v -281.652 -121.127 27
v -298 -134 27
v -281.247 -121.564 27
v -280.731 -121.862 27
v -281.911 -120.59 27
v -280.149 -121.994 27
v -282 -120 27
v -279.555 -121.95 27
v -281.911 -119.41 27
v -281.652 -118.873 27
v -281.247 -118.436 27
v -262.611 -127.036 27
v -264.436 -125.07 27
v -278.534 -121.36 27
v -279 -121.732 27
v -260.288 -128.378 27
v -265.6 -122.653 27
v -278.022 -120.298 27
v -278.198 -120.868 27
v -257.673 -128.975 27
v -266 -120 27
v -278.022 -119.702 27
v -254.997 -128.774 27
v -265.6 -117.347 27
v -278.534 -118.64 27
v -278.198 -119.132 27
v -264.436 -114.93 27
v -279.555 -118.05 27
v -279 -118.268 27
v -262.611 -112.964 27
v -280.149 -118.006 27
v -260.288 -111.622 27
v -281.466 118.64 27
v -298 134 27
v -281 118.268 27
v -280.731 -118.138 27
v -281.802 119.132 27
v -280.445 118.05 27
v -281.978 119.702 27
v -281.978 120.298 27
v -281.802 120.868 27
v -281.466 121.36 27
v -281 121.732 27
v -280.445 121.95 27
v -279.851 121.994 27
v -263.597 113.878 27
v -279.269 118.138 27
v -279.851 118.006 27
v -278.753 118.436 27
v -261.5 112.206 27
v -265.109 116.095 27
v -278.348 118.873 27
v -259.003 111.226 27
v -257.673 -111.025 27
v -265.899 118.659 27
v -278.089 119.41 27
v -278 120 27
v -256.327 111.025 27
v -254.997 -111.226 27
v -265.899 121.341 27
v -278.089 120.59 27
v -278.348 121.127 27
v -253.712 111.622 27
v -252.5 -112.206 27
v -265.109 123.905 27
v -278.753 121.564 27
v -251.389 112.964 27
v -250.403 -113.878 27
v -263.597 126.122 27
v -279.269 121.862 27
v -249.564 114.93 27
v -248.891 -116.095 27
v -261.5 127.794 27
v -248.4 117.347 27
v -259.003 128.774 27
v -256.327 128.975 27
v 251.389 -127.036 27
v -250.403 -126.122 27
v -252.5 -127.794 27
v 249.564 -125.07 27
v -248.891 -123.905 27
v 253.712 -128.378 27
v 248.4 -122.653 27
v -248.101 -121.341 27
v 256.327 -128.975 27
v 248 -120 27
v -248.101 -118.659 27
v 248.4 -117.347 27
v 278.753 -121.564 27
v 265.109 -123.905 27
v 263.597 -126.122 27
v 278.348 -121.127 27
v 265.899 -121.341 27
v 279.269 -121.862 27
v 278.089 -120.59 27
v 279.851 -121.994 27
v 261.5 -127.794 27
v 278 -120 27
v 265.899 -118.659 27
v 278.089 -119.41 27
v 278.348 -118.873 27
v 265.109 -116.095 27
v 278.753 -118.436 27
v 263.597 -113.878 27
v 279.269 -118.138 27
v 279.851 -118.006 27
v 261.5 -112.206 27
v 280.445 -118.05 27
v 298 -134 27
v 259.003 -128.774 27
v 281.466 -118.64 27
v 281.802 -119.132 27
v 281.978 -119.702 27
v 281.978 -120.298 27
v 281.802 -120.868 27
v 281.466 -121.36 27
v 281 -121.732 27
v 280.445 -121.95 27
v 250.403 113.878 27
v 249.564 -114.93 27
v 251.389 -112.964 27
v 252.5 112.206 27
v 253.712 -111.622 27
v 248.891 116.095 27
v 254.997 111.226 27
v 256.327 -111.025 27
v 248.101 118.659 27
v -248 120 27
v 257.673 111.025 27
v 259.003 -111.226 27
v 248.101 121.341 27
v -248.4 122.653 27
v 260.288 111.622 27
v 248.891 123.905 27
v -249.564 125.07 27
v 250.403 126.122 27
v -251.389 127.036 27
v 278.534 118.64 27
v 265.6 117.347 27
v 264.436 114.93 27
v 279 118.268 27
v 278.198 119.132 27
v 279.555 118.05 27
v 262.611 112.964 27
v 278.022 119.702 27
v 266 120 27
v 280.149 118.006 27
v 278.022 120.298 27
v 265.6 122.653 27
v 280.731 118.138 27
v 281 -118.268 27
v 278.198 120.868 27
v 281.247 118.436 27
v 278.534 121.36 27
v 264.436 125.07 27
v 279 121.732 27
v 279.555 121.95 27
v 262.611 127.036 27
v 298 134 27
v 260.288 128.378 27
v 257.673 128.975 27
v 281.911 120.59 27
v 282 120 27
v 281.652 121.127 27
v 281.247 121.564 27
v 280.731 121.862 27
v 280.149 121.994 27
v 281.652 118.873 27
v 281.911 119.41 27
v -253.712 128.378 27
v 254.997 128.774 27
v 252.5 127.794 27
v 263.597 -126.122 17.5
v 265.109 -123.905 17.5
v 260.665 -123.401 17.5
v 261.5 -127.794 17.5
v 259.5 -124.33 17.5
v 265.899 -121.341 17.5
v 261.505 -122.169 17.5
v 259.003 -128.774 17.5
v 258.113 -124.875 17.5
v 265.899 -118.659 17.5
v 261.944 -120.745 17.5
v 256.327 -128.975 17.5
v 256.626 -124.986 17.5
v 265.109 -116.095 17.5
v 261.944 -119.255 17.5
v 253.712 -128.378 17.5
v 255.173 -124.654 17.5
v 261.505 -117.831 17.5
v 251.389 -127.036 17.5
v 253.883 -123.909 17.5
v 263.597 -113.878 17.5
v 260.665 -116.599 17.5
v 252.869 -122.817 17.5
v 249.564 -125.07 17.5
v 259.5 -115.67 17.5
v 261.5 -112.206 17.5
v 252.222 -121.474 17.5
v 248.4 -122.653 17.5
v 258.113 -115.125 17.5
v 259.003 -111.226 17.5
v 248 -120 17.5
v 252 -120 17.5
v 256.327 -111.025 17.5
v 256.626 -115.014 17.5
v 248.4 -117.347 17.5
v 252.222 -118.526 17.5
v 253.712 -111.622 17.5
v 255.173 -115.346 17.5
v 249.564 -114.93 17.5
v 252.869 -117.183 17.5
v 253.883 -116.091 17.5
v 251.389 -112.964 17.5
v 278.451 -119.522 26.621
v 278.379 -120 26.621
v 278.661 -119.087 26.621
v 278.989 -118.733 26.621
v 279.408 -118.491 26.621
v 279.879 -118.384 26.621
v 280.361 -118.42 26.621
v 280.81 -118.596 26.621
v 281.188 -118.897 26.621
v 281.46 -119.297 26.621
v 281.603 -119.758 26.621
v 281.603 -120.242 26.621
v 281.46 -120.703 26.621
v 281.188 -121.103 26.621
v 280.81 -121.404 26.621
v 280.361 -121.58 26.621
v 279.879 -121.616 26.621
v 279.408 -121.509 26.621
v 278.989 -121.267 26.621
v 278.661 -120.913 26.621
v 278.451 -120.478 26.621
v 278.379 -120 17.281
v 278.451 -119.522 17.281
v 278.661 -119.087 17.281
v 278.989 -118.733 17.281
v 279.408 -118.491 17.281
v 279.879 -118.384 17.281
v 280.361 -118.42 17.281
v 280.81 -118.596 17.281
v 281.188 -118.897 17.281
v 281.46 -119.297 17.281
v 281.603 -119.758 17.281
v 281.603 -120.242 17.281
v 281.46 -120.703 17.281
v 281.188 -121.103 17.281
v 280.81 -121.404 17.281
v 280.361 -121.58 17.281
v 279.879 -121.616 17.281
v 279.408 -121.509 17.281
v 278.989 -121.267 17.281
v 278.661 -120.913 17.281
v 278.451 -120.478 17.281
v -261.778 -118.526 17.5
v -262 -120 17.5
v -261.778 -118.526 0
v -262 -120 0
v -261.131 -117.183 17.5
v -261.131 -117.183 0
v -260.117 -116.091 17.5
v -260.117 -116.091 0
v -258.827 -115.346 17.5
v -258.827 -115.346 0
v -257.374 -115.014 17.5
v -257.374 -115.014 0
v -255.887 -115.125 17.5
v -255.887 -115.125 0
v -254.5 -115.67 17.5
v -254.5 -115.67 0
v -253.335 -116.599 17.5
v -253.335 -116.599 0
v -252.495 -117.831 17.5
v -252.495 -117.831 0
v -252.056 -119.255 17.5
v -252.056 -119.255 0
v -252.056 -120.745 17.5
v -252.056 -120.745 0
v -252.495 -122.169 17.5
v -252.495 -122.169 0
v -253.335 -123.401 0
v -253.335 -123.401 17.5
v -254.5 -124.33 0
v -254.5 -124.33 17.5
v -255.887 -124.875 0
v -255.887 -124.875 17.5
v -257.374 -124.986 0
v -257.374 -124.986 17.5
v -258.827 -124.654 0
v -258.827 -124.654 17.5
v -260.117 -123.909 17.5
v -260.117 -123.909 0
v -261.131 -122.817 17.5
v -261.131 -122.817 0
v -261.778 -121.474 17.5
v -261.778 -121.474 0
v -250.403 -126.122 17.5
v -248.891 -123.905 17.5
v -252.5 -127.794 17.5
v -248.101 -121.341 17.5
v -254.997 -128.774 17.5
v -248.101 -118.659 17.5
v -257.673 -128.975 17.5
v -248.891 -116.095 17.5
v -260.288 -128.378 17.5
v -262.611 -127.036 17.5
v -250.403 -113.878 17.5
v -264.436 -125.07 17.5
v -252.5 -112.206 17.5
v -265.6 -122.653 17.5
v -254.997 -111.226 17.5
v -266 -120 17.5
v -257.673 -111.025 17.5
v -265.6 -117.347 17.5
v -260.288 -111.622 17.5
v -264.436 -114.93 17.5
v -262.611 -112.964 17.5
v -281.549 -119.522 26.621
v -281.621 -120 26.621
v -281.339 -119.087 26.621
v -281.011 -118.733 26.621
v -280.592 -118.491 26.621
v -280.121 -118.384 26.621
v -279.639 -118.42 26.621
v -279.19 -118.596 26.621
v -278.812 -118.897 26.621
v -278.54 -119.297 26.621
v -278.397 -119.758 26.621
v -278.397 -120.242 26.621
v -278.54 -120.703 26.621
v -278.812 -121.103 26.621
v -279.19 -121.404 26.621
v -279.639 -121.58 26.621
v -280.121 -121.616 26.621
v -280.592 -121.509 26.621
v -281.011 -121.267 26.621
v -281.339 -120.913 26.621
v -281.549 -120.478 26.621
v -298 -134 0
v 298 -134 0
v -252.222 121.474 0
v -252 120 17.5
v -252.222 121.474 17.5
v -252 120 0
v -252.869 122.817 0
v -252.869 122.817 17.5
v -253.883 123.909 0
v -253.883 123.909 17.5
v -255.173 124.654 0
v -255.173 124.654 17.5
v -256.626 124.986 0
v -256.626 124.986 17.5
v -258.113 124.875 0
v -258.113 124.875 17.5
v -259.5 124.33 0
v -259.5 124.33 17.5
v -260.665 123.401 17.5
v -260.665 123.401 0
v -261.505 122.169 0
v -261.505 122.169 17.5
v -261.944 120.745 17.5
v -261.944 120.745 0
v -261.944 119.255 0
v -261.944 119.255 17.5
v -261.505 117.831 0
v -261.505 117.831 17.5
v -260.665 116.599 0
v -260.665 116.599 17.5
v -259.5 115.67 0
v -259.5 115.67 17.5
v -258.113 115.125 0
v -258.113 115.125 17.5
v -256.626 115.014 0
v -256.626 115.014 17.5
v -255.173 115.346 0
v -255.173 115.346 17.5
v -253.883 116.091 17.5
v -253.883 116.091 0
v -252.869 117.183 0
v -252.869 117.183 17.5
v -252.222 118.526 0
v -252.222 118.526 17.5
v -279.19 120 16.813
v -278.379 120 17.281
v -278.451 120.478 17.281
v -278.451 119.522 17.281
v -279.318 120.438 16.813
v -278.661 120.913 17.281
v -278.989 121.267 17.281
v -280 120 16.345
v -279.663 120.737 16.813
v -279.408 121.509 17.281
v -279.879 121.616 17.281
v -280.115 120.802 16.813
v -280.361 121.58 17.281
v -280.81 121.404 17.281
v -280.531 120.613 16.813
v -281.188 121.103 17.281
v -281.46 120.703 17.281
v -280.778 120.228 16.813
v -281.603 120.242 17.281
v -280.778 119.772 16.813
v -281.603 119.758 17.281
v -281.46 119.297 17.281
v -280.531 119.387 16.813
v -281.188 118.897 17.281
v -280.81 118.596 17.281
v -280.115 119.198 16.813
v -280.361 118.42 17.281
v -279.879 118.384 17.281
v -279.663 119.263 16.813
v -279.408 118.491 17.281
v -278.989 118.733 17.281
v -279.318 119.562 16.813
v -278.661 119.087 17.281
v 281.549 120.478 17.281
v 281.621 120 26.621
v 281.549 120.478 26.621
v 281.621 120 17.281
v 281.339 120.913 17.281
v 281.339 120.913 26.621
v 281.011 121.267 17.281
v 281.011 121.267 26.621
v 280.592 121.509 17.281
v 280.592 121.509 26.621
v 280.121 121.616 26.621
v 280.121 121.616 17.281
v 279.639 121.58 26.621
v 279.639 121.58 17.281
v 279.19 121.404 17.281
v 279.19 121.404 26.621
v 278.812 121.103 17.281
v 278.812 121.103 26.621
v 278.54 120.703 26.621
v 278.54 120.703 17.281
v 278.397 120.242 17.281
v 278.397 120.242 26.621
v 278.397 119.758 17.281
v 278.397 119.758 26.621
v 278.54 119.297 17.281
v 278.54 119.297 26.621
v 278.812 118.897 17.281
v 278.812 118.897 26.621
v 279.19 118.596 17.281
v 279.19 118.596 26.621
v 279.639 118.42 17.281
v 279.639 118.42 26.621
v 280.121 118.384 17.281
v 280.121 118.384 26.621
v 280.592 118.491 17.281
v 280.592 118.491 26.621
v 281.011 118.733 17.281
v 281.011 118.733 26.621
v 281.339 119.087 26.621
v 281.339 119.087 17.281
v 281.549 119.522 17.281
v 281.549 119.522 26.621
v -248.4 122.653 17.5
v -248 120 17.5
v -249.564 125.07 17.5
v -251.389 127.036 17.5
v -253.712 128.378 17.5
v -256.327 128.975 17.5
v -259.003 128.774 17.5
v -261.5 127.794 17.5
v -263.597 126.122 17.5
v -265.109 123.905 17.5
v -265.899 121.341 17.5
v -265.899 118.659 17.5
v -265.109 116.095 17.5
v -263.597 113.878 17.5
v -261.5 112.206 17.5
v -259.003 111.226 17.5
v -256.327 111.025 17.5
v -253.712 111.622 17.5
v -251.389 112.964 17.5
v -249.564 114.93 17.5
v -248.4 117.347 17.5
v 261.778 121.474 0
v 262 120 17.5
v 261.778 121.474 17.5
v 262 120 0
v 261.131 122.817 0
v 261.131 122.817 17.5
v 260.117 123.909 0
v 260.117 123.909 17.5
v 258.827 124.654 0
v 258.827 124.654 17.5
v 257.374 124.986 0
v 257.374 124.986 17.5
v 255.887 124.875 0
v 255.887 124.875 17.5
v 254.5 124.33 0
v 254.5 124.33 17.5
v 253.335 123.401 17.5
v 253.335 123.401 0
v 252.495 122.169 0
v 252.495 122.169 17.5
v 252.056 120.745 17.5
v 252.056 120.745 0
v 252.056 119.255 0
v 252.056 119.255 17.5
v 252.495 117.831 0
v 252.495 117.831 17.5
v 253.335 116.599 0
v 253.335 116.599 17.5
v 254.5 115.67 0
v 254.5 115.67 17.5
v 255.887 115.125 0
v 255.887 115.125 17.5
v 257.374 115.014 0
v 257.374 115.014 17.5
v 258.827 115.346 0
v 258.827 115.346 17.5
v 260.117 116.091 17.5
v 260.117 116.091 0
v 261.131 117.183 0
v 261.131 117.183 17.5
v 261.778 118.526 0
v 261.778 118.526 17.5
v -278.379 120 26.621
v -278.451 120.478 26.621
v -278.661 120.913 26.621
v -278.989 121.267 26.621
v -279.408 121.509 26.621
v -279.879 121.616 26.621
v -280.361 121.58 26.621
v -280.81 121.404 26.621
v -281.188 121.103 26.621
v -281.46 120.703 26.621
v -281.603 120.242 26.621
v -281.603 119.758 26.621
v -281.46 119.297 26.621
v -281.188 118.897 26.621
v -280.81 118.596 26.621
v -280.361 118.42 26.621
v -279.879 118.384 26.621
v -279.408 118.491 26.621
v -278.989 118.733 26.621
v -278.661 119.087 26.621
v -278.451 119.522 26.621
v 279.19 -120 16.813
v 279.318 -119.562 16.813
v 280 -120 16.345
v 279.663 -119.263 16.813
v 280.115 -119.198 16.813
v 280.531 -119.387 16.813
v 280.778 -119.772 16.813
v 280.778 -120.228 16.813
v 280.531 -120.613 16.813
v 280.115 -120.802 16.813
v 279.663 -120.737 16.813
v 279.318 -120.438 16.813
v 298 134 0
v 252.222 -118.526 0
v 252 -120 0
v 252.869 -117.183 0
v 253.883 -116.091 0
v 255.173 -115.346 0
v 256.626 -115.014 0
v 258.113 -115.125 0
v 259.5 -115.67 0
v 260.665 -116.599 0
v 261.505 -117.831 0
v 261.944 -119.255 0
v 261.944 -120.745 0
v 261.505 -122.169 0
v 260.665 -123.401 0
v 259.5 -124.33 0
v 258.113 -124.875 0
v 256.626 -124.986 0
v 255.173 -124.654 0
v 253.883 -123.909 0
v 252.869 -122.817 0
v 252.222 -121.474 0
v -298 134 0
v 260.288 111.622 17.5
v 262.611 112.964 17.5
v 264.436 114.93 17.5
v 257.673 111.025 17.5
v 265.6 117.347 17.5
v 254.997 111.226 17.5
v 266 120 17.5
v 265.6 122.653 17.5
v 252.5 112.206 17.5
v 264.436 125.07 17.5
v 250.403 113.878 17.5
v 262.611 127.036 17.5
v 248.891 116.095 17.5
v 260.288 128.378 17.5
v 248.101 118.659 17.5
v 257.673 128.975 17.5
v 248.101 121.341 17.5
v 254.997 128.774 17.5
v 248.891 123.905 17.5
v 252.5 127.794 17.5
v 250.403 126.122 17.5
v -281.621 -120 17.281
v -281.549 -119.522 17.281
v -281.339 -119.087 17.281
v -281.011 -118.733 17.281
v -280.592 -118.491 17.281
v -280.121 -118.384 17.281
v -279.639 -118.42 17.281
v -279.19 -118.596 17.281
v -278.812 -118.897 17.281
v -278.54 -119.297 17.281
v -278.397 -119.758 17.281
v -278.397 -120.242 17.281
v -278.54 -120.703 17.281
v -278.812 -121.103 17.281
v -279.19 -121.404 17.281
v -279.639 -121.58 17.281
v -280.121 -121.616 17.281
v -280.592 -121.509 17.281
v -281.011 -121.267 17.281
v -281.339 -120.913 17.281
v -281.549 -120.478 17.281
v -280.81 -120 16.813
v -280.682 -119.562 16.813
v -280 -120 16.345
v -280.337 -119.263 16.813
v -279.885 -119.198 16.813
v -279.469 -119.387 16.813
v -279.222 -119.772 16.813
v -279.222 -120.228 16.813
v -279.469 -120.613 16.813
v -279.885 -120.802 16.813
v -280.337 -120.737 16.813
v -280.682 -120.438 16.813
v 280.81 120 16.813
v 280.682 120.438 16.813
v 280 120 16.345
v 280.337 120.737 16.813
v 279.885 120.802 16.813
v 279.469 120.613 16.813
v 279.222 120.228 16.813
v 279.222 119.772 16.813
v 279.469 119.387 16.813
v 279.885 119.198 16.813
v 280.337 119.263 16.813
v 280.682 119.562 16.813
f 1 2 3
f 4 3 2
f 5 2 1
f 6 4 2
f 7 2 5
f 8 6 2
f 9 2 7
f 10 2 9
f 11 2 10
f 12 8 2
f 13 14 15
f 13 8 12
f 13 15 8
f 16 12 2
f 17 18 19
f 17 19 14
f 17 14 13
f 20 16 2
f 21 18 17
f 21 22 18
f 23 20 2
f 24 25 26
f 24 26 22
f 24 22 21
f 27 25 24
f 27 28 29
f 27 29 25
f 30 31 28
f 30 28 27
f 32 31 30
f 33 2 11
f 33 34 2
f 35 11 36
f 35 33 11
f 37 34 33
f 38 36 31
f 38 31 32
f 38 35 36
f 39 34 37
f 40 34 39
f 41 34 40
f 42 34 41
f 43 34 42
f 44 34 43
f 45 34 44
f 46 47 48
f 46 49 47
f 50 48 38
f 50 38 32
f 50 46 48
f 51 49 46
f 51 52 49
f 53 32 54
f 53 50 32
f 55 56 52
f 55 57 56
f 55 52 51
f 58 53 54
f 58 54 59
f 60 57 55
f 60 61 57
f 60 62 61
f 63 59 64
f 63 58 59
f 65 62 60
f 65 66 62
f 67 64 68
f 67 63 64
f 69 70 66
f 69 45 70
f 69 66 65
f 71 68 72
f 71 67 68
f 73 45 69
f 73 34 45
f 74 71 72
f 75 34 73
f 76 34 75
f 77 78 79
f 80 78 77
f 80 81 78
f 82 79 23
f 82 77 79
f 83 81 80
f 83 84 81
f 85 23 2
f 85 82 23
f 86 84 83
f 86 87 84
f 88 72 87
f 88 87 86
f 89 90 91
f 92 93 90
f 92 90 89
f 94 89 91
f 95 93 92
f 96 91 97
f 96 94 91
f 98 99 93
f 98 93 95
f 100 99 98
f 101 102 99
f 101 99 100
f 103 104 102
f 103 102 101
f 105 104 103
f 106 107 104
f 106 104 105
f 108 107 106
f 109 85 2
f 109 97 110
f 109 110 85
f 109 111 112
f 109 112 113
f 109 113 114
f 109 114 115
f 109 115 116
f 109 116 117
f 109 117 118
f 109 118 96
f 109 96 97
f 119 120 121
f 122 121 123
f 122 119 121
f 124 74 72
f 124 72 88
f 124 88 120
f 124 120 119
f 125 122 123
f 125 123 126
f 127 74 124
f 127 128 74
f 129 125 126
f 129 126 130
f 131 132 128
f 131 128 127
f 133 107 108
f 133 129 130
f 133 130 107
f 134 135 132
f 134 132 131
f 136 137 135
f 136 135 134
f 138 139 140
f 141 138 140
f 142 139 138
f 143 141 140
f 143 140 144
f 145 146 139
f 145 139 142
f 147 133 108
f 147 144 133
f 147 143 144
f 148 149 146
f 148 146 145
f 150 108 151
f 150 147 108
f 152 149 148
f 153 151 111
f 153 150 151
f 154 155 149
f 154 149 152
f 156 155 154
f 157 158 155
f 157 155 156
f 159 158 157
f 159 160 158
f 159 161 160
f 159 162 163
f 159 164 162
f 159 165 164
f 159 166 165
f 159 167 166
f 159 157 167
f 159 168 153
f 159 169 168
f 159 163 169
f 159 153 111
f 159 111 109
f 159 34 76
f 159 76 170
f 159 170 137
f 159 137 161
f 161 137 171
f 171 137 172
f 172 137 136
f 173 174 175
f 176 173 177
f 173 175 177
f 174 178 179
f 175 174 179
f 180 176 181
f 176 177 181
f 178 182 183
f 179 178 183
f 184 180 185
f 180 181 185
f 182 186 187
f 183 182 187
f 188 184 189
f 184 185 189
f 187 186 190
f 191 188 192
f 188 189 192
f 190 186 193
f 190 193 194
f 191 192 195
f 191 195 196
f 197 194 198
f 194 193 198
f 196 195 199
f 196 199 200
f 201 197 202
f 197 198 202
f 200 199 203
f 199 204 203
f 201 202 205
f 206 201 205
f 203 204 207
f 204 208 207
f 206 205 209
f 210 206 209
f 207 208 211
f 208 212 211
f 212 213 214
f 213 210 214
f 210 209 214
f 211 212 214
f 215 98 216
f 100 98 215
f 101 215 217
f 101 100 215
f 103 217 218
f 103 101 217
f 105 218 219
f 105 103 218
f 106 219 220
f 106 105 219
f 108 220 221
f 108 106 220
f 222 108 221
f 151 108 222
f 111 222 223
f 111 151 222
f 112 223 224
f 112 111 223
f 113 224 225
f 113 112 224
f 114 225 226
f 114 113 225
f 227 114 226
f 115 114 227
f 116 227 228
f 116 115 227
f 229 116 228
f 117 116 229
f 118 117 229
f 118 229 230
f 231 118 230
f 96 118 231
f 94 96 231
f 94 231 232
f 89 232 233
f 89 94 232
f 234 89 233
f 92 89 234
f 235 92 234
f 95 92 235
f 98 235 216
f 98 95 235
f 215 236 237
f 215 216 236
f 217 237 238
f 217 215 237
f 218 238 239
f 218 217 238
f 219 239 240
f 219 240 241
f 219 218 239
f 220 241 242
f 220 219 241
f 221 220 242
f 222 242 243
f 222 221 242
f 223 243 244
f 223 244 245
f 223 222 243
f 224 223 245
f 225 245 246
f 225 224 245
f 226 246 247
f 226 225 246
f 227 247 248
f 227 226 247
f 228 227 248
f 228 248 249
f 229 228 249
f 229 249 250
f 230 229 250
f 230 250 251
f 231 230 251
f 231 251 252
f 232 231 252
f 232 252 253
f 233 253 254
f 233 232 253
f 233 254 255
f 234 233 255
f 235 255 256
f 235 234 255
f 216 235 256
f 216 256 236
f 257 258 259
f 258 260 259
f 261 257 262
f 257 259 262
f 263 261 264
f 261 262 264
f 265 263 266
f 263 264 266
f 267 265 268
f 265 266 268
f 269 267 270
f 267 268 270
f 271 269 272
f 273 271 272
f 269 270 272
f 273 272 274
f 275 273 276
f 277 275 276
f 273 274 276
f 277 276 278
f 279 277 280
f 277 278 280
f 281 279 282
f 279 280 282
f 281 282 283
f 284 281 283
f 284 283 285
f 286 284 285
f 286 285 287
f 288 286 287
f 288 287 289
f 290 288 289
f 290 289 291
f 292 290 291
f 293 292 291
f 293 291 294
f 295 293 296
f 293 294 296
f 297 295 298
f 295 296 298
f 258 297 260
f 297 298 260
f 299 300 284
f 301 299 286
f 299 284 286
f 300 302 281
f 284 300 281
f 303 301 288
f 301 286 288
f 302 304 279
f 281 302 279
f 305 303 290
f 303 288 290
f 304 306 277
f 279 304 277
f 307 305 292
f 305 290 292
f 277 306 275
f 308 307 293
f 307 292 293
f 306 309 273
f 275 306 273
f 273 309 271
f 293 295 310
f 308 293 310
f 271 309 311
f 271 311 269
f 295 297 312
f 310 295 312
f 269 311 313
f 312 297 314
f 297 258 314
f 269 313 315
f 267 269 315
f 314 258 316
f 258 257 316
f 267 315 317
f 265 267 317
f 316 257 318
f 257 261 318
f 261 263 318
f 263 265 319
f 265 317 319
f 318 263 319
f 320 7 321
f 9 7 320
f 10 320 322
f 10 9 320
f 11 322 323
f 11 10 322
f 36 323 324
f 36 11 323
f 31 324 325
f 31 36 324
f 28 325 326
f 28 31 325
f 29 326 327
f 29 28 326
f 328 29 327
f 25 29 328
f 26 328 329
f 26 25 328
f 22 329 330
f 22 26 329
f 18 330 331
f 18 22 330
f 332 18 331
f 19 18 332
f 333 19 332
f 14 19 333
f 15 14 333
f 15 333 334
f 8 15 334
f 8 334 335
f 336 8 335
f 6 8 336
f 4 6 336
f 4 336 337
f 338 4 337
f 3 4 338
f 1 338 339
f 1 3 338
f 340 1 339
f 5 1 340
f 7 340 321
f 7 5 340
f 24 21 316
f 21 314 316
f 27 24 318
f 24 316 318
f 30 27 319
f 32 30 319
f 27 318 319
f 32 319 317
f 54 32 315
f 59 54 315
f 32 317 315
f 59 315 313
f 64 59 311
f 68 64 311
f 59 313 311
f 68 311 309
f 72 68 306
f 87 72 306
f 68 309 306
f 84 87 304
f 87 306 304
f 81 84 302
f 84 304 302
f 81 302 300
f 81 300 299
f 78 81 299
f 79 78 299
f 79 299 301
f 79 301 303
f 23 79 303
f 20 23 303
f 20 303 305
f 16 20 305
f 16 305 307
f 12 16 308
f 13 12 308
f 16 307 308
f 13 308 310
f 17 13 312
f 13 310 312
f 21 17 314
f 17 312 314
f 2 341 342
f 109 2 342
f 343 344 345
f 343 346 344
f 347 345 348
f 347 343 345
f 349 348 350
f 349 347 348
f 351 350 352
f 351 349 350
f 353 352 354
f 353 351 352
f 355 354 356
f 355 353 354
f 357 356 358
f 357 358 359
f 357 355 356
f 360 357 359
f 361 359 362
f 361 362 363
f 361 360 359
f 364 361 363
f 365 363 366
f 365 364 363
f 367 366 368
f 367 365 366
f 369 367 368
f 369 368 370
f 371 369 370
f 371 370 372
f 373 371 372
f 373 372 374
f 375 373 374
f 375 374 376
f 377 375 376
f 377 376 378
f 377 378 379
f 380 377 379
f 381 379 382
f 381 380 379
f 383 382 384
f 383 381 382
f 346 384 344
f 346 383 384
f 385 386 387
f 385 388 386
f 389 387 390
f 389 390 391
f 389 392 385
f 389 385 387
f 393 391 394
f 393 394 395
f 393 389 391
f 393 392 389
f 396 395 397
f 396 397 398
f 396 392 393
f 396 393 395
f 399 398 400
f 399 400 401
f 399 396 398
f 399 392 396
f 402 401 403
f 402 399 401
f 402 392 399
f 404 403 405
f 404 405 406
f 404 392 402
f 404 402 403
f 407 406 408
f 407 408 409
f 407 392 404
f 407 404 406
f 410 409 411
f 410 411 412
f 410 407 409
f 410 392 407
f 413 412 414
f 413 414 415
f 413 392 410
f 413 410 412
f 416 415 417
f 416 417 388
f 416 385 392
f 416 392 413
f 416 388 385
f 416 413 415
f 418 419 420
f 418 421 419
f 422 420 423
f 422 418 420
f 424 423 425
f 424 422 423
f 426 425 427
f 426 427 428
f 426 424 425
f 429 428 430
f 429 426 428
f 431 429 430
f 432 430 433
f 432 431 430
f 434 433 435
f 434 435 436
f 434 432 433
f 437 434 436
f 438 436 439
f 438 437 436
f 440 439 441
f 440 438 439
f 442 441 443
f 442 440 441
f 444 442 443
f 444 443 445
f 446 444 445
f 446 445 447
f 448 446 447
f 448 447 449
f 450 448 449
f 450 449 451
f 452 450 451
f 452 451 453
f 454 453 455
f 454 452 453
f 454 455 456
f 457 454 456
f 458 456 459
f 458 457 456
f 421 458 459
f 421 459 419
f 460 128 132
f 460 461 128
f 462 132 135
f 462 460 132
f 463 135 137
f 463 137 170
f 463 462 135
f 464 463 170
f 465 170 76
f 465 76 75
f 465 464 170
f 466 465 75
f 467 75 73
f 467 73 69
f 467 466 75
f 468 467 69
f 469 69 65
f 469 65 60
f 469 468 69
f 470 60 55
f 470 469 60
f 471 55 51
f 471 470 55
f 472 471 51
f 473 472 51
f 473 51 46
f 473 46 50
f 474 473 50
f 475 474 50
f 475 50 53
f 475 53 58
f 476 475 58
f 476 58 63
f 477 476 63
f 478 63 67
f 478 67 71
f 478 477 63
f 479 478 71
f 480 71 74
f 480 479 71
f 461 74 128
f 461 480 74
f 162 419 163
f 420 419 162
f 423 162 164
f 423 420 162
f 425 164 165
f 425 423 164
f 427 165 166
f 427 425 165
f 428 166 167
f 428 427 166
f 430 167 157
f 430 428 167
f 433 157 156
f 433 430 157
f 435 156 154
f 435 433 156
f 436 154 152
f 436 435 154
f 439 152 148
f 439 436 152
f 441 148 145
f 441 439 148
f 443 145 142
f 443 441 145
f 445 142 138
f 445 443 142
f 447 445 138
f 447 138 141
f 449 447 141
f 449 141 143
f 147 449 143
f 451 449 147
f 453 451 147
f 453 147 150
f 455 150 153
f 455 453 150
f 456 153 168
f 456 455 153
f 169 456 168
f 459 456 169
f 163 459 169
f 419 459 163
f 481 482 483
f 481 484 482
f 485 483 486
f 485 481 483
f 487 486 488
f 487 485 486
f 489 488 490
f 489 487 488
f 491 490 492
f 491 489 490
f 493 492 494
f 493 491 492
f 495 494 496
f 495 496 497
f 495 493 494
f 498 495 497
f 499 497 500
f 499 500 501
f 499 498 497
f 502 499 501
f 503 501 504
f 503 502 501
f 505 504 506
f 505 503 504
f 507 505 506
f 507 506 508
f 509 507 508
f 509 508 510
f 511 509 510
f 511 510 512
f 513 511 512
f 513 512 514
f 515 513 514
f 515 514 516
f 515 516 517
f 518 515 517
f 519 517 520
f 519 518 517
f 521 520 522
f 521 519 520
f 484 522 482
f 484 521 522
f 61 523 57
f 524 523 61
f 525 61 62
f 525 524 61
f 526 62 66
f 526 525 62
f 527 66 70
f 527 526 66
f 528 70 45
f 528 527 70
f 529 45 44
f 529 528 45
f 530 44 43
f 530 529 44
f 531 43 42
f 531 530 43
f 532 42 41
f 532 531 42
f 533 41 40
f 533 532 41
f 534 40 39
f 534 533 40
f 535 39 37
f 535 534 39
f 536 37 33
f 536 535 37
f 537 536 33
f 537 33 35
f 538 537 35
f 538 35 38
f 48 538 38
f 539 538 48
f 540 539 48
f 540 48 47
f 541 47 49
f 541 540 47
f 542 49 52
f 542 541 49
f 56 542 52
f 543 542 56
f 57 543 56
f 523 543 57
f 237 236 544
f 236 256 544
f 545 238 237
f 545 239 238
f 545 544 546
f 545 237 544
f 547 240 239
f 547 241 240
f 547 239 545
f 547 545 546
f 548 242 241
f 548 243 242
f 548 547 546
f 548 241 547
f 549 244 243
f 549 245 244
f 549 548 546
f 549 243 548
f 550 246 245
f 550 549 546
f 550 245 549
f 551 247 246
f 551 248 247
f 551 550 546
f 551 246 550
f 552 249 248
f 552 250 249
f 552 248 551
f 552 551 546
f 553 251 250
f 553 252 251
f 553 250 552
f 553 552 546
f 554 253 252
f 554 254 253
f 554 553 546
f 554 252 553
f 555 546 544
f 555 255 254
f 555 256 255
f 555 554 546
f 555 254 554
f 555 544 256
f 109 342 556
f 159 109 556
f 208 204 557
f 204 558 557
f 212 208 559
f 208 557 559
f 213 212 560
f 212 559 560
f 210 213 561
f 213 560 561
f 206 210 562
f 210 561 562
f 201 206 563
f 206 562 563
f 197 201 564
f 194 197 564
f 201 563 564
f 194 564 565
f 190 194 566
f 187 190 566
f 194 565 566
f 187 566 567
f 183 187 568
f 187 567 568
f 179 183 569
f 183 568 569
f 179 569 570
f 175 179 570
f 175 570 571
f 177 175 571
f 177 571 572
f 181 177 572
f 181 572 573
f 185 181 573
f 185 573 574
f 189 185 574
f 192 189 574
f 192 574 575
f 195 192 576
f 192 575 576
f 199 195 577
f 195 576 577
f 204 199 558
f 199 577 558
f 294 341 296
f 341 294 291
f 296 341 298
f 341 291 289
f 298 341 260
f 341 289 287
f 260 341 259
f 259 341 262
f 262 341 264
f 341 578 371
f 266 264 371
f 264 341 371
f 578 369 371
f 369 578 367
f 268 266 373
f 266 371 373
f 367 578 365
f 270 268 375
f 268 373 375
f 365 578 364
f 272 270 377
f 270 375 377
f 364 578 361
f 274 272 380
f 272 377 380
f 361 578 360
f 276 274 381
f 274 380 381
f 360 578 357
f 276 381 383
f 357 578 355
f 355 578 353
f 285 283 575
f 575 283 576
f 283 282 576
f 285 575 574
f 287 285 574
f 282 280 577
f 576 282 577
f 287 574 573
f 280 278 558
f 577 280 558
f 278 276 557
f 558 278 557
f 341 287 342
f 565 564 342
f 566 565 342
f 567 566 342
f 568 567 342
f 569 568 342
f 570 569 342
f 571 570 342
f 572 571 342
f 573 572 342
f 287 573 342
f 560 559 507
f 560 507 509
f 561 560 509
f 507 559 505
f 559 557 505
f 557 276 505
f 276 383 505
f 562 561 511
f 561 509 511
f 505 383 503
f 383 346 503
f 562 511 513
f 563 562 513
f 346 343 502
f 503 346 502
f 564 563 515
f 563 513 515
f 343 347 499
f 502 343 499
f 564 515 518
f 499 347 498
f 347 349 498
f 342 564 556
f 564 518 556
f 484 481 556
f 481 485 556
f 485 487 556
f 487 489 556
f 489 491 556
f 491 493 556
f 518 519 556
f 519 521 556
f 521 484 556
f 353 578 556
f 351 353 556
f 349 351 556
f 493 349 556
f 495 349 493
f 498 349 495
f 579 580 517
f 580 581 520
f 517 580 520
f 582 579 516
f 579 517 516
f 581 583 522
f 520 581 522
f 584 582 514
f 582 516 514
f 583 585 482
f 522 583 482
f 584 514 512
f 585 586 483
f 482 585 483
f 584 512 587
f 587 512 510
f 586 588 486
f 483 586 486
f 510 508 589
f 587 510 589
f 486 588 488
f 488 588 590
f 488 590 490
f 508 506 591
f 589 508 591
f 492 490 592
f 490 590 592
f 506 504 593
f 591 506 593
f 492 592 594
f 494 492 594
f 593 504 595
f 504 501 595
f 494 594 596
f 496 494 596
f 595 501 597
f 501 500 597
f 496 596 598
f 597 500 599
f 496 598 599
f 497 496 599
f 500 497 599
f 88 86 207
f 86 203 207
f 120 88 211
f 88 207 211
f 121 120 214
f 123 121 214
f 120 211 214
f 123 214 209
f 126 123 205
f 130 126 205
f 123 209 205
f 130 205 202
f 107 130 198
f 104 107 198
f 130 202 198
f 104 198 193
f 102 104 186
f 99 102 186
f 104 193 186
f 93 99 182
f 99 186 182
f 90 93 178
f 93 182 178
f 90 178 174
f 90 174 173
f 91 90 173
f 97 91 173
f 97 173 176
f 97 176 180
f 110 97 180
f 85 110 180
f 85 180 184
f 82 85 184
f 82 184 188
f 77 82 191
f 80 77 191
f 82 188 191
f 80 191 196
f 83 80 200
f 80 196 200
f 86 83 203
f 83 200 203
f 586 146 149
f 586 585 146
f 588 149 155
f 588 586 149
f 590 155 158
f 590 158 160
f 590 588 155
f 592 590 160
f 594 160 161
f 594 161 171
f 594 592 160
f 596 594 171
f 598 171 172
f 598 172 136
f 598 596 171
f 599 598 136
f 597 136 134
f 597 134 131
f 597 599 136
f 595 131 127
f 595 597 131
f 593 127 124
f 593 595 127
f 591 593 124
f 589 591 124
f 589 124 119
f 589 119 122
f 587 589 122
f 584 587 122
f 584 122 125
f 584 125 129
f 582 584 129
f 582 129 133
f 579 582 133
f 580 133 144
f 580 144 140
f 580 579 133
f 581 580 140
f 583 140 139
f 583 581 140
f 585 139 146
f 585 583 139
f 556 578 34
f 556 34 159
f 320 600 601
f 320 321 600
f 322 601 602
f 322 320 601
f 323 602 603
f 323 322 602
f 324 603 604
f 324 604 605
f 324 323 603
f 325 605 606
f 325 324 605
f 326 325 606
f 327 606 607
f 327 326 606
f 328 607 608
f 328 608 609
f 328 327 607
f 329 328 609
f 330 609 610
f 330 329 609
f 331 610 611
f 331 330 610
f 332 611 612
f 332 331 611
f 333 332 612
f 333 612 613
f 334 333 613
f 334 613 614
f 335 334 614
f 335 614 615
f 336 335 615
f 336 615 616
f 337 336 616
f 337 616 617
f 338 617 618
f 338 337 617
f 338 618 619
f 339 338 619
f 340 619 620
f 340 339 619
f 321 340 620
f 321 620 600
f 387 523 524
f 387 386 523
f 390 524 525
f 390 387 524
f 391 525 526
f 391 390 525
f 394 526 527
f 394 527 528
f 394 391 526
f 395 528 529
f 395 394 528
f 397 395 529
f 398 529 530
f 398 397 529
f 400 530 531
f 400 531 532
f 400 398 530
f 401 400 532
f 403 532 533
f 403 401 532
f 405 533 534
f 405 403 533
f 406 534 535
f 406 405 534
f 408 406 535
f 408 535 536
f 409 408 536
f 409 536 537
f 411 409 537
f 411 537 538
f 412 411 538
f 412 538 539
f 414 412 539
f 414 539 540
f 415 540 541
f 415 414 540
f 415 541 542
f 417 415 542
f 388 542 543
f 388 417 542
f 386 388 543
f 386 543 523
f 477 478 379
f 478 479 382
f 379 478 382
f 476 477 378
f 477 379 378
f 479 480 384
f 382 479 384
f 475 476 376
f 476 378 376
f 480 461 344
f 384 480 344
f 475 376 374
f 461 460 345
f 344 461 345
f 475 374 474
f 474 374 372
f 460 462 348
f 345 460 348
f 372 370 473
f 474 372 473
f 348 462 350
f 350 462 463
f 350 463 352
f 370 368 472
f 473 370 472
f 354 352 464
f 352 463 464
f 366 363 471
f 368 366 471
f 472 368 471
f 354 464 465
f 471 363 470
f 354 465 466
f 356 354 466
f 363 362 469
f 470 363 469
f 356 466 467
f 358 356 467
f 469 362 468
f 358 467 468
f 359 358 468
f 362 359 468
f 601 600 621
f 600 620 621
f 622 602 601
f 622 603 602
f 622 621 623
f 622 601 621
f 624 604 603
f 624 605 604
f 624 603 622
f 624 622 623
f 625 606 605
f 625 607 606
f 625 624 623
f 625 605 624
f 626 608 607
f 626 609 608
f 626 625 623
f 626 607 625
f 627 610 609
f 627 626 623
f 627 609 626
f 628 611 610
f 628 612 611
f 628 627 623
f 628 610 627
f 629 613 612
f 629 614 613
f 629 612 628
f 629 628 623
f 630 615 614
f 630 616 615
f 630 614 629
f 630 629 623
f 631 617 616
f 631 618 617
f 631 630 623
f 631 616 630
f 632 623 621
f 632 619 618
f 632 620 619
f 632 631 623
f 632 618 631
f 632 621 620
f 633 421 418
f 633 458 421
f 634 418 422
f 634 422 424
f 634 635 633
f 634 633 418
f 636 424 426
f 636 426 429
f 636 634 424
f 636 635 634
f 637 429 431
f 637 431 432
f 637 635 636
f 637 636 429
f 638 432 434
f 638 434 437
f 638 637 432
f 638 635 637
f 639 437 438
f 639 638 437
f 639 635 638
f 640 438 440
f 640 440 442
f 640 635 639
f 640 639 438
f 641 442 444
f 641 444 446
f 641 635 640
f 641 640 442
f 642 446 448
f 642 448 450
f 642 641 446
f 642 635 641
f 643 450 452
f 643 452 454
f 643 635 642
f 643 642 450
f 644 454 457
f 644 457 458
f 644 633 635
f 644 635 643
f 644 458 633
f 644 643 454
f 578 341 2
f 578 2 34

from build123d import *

# Parameters (mm, degrees)
SZKIC1_W                    = 596
SZKIC1_H                    = 268
DODANIE_WYCI_GNI_CIE1_DEPTH = 27
SZKIC2_W                    = 17.5
SZKIC2_H                    = 5
SZKIC3_W                    = 17.5
SZKIC3_H                    = 5
SZKIC4_W                    = 17.5
SZKIC4_H                    = 5
SZKIC5_W                    = 17.5
SZKIC5_H                    = 5
SZKIC6_W                    = 9.5
SZKIC6_H                    = 9
SZKIC7_W                    = 9.5
SZKIC7_H                    = 9
SZKIC8_W                    = 9.5
SZKIC8_H                    = 9
SZKIC9_W                    = 9.5
SZKIC9_H                    = 9


with BuildPart() as part:
    # Szkic1 → Dodanie-wyciągnięcie1 (new body)
    with BuildSketch(Plane.XY):
        Rectangle(SZKIC1_W, SZKIC1_H)
    extrude(amount=DODANIE_WYCI_GNI_CIE1_DEPTH)

    # Szkic2 → Wycięcie-obrót1 (revolve, cut)
    with BuildSketch(Plane(origin=(257, 0, 0), x_dir=(0, 0, -1), z_dir=(1, 0, 0))):
        with Locations((-8.75, 122.5)):
            Rectangle(SZKIC2_W, SZKIC2_H)
    revolve(axis=Axis((257, 120, 0), (0, 0, 1)), mode=Mode.SUBTRACT)

    # Szkic3 → Wycięcie-obrót2 (revolve, cut)
    with BuildSketch(Plane(origin=(257, 0, 0), x_dir=(0, 0, -1), z_dir=(1, 0, 0))):
        with Locations((-8.75, -122.5)):
            Rectangle(SZKIC3_W, SZKIC3_H)
    revolve(axis=Axis((257, -120, 17.5), (0, 0, -1)), mode=Mode.SUBTRACT)

    # Szkic4 → Wycięcie-obrót3 (revolve, cut)
    with BuildSketch(Plane(origin=(-257, 0, 0), x_dir=(0, 0, -1), z_dir=(1, 0, 0))):
        with Locations((-8.75, 122.5)):
            Rectangle(SZKIC4_W, SZKIC4_H)
    revolve(axis=Axis((-257, 120, 0), (0, 0, 1)), mode=Mode.SUBTRACT)

    # Szkic5 → Wycięcie-obrót4 (revolve, cut)
    with BuildSketch(Plane(origin=(-257, 0, 0), x_dir=(0, 0, -1), z_dir=(1, 0, 0))):
        with Locations((-8.75, -122.5)):
            Rectangle(SZKIC5_W, SZKIC5_H)
    revolve(axis=Axis((-257, -120, 17.5), (0, 0, -1)), mode=Mode.SUBTRACT)

    # Szkic6 → Wycięcie-obrót5 (revolve, cut)
    with BuildSketch(Plane(origin=(-257, 0, 0), x_dir=(0, 0, -1), z_dir=(1, 0, 0))):
        with Locations((-22.25, 124.5)):
            Rectangle(SZKIC6_W, SZKIC6_H)
    revolve(axis=Axis((-257, 120, 17.5), (0, 0, 1)), mode=Mode.SUBTRACT)

    # Szkic7 → Wycięcie-obrót6 (revolve, cut)
    with BuildSketch(Plane(origin=(257, 0, 0), x_dir=(0, 0, -1), z_dir=(1, 0, 0))):
        with Locations((-22.25, 124.5)):
            Rectangle(SZKIC7_W, SZKIC7_H)
    revolve(axis=Axis((257, 120, 17.5), (0, 0, 1)), mode=Mode.SUBTRACT)

    # Szkic8 → Wycięcie-obrót7 (revolve, cut)
    with BuildSketch(Plane(origin=(-257, 0, 0), x_dir=(0, 0, -1), z_dir=(1, 0, 0))):
        with Locations((-22.25, -124.5)):
            Rectangle(SZKIC8_W, SZKIC8_H)
    revolve(axis=Axis((-257, -120, 27), (0, 0, -1)), mode=Mode.SUBTRACT)

    # Szkic9 → Wycięcie-obrót8 (revolve, cut)
    with BuildSketch(Plane(origin=(257, 0, 0), x_dir=(0, 0, -1), z_dir=(1, 0, 0))):
        with Locations((-22.25, -124.5)):
            Rectangle(SZKIC9_W, SZKIC9_H)
    revolve(axis=Axis((257, -120, 27), (0, 0, -1)), mode=Mode.SUBTRACT)

    # Szkic10 → Wycięcie-obrót9 (revolve, cut)
    with BuildSketch(Plane(origin=(-280, 0, 0), x_dir=(0, 0, -1), z_dir=(1, 0, 0))):
        Polygon((-27, 120), (-27, 122), (-26.621, 121.621), (-17.281184248, 121.621), (-16.345299462, 120), align=None)
    revolve(axis=Axis((-280, 120, 16.345299462), (0, 0, 1)), mode=Mode.SUBTRACT)

    # Szkic11 → Wycięcie-obrót10 (revolve, cut)
    with BuildSketch(Plane(origin=(-280, 0, 0), x_dir=(0, 0, -1), z_dir=(1, 0, 0))):
        Polygon((-16.345299462, -120), (-17.281184248, -121.621), (-26.621, -121.621), (-27, -122), (-27, -120), align=None)
    revolve(axis=Axis((-280, -120, 27), (0, 0, -1)), mode=Mode.SUBTRACT)

    # Szkic12 → Wycięcie-obrót11 (revolve, cut)
    with BuildSketch(Plane(origin=(280, 0, 0), x_dir=(0, 0, -1), z_dir=(1, 0, 0))):
        Polygon((-27, 120), (-27, 122), (-26.621, 121.621), (-17.281184248, 121.621), (-16.345299462, 120), align=None)
    revolve(axis=Axis((280, 120, 16.345299462), (0, 0, 1)), mode=Mode.SUBTRACT)

    # Szkic13 → Wycięcie-obrót12 (revolve, cut)
    with BuildSketch(Plane(origin=(280, 0, 0), x_dir=(0, 0, -1), z_dir=(1, 0, 0))):
        Polygon((-16.345299462, -120), (-17.281184248, -121.621), (-26.621, -121.621), (-27, -122), (-27, -120), align=None)
    revolve(axis=Axis((280, -120, 27), (0, 0, -1)), mode=Mode.SUBTRACT)


solid = part.part
